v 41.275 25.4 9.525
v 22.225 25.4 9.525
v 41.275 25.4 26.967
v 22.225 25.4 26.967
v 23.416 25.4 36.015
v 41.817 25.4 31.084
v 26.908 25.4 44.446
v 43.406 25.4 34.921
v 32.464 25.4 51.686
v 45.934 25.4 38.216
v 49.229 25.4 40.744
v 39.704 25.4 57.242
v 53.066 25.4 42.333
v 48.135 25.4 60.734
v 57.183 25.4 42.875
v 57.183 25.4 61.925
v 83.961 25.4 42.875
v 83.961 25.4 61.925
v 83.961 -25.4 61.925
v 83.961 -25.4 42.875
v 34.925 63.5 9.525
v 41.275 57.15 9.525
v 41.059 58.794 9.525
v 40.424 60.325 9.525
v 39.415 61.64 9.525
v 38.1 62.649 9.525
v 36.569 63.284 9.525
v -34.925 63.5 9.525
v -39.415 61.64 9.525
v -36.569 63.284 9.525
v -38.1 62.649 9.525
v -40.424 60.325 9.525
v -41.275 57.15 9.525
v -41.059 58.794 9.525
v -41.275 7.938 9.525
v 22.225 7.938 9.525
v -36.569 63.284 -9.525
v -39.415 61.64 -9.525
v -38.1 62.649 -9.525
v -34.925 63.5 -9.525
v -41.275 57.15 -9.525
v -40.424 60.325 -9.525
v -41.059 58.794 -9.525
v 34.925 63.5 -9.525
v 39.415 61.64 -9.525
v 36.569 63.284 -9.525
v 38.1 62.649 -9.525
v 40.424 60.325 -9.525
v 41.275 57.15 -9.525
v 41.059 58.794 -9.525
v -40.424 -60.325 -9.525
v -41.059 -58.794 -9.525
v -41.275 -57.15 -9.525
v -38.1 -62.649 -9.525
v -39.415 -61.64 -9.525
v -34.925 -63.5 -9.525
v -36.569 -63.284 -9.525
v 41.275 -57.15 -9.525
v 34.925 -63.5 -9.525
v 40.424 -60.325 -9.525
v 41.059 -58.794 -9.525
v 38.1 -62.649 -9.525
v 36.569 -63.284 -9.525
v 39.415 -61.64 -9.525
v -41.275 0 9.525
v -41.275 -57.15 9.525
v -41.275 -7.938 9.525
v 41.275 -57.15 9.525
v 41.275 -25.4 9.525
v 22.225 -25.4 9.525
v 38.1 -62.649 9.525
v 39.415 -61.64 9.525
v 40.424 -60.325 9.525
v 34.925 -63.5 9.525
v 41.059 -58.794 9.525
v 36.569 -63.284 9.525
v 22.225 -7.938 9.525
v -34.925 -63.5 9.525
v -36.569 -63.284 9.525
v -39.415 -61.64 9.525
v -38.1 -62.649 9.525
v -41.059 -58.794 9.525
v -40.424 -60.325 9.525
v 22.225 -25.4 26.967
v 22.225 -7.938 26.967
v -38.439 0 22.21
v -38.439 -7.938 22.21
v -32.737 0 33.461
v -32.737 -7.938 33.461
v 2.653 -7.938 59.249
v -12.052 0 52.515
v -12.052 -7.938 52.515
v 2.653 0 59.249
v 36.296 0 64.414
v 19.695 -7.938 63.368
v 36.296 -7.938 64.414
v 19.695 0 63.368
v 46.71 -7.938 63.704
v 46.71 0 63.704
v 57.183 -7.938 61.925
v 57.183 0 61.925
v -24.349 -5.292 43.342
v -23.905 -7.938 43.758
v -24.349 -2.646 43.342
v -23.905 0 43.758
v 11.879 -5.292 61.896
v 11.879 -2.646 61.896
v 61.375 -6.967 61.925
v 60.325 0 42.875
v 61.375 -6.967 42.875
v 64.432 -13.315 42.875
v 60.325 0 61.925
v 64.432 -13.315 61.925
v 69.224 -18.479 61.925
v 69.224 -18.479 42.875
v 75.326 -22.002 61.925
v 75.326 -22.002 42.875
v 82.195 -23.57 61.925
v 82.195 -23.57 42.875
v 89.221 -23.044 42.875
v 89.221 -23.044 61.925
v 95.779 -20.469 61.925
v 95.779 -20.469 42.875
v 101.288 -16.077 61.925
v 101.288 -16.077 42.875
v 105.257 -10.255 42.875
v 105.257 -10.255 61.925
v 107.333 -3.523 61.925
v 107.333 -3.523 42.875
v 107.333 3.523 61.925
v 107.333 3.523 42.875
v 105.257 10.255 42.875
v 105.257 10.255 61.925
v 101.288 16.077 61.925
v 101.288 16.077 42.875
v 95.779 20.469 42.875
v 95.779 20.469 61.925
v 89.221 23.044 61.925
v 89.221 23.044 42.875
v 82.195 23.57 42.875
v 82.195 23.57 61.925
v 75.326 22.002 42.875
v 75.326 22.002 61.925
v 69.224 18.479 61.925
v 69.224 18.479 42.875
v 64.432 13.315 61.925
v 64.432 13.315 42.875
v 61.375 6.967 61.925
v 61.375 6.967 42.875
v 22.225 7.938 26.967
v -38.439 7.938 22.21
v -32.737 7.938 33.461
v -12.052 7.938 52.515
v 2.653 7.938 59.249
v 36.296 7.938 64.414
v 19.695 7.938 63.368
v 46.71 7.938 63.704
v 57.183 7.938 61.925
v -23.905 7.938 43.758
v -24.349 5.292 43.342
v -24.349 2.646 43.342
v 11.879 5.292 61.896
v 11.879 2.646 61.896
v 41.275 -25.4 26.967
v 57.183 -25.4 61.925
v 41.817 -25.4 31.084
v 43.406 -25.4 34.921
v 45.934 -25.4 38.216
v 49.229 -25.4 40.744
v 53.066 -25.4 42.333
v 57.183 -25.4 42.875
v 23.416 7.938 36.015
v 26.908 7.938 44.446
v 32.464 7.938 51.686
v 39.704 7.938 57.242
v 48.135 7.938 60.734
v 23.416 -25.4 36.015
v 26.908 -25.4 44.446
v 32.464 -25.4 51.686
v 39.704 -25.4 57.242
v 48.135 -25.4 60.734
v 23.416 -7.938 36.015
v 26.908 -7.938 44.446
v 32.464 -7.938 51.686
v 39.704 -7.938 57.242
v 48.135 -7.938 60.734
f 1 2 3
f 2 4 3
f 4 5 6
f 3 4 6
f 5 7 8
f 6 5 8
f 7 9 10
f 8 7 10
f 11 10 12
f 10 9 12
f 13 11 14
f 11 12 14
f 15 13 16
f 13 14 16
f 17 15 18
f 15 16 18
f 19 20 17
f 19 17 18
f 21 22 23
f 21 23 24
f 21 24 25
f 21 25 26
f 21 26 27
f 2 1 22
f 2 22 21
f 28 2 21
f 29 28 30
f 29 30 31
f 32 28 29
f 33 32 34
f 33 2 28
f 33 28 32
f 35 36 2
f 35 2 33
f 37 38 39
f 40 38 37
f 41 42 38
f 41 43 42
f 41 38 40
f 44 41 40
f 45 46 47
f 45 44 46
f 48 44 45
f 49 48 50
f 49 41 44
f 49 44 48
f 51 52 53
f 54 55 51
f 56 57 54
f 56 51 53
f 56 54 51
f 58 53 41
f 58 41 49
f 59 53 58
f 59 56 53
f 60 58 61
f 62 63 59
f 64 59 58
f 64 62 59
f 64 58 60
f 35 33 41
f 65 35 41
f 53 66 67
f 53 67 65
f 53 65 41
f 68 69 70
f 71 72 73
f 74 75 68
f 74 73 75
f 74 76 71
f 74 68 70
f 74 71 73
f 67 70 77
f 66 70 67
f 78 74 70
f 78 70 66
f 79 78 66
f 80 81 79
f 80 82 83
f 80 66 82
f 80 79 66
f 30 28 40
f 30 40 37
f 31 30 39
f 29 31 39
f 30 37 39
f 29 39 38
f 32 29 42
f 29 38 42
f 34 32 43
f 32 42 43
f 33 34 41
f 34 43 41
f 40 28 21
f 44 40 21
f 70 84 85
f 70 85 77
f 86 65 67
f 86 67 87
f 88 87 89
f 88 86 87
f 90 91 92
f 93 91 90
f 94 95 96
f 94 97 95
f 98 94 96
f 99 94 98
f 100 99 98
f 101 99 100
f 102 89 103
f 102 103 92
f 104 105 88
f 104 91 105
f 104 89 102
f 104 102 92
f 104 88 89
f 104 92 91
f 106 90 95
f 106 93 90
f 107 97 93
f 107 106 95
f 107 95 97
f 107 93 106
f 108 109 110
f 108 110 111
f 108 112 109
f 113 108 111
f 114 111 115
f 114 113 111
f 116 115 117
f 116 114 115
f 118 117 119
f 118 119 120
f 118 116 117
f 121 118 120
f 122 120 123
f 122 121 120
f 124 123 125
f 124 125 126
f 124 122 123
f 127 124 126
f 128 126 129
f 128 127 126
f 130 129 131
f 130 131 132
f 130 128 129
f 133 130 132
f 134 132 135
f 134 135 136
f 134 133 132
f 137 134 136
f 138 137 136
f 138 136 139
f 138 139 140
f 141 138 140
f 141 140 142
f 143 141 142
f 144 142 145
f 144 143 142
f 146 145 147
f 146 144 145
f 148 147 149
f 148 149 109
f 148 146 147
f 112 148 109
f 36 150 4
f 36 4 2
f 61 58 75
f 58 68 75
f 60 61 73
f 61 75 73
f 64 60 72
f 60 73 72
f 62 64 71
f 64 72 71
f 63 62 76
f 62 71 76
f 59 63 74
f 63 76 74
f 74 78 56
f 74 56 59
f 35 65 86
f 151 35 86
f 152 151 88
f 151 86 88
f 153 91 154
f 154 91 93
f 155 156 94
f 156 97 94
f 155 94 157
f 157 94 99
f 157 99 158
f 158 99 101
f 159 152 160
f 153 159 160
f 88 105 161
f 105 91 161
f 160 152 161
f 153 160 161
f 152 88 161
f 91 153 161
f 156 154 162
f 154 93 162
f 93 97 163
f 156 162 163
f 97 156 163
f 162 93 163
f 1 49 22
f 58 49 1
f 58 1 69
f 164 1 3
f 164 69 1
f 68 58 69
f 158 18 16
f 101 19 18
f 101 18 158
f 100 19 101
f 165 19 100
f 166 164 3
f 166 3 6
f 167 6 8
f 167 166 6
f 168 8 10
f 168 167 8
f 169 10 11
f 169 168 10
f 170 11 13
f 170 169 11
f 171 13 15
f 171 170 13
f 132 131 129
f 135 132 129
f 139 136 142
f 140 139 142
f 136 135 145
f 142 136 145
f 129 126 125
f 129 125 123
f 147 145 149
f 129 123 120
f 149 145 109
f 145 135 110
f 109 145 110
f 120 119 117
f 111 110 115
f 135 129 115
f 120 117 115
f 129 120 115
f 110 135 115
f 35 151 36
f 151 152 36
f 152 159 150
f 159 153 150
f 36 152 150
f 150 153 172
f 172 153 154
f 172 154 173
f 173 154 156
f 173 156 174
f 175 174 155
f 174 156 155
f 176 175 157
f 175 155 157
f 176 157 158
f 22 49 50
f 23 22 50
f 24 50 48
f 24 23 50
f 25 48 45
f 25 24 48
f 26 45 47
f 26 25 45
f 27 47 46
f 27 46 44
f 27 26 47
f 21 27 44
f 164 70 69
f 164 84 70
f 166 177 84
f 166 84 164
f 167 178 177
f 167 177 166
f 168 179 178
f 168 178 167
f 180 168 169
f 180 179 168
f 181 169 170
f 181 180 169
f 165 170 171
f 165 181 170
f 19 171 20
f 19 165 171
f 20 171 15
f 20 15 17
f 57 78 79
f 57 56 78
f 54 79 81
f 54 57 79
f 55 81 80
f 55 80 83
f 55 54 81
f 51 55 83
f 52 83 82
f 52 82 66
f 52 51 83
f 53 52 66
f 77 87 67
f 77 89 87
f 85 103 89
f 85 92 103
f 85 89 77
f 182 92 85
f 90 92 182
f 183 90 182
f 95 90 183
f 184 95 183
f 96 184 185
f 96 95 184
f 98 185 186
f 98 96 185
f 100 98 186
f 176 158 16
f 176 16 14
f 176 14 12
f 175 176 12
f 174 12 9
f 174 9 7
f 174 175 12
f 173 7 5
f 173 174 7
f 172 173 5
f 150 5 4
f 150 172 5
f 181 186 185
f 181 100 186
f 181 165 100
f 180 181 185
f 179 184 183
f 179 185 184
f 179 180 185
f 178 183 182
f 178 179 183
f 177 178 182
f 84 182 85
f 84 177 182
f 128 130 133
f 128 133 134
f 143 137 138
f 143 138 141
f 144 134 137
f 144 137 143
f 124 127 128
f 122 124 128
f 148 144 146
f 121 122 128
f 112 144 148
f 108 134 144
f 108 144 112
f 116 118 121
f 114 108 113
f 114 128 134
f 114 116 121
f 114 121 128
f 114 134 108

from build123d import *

# Parameters (mm, degrees)
F1_DEPTH = 63.5
F0_W     = 23.636122
F0_H     = 19.05
F2_DEPTH = 25.4
F3_DEPTH = 7.9375
F5_R     = 6.35


with BuildPart() as f1:
    # F0 (on Front) → F1 (new body, symmetric)
    with BuildSketch(Plane.XZ):
        Polygon((41.275, -9.525), (41.275, 9.525), (22.225, 9.525), (-41.275, 9.525), (-41.275, -9.525), align=None)
    extrude(amount=F1_DEPTH, both=True)

    # F0 (on Front) → F2 (join, symmetric)
    with BuildSketch(Plane.XZ):
        with BuildLine():
            Line((22.225, 9.525), (41.275, 9.525))
            Line((41.275, 9.525), (41.275, 26.967128))
            ThreePointArc((41.275, 26.967128), (45.934366, 38.215834), (57.183072, 42.8752))
            Line((57.183072, 42.8752), (60.325, 42.8752))
            Line((60.325, 42.8752), (60.325, 61.9252))
            Line((60.325, 61.9252), (57.183072, 61.9252))
            ThreePointArc((57.183072, 61.9252), (32.463982, 51.686218), (22.225, 26.967128))
            Line((22.225, 26.967128), (22.225, 9.525))
        make_face()
        with Locations((72.143061, 52.4002)):
            Rectangle(F0_W, F0_H)
    extrude(amount=F2_DEPTH, both=True)

    # F0 (on Front) → F3 (join, symmetric)
    with BuildSketch(Plane.XZ):
        with BuildLine():
            Line((-41.275, 9.525), (22.225, 9.525))
            Line((22.225, 9.525), (22.225, 26.967128))
            ThreePointArc((22.225, 26.967128), (32.463982, 51.686218), (57.183072, 61.9252))
            add(Edge.make_bspline(
                [(-41.275, 9.525), (-37.408441, 49.887042), (10.748739, 72.245739), (57.183072, 61.9252)],
                knots=[0, 0, 0, 0, 111.53373, 111.53373, 111.53373, 111.53373], degree=3))
        make_face()
    extrude(amount=F3_DEPTH, both=True)

    # F5
    f5_edges = [f1.edges().sort_by_distance(p)[0] for p in [
        (-41.275, 63.5, 0),
        (41.275, 63.5, 0),
        (-41.275, -63.5, 0),
        (41.275, -63.5, 0),
    ]]
    fillet(f5_edges, radius=F5_R)


with BuildPart() as f4:
    # F0 (on Front) → F4 (revolve)
    with BuildSketch(Plane.XZ):
        with Locations((72.143061, 52.4002)):
            Rectangle(F0_W, F0_H)
    revolve(axis=Axis((83.961122, 0, 52.4002), (0, 0, 1)))


solid = Compound([f1.part, f4.part])
